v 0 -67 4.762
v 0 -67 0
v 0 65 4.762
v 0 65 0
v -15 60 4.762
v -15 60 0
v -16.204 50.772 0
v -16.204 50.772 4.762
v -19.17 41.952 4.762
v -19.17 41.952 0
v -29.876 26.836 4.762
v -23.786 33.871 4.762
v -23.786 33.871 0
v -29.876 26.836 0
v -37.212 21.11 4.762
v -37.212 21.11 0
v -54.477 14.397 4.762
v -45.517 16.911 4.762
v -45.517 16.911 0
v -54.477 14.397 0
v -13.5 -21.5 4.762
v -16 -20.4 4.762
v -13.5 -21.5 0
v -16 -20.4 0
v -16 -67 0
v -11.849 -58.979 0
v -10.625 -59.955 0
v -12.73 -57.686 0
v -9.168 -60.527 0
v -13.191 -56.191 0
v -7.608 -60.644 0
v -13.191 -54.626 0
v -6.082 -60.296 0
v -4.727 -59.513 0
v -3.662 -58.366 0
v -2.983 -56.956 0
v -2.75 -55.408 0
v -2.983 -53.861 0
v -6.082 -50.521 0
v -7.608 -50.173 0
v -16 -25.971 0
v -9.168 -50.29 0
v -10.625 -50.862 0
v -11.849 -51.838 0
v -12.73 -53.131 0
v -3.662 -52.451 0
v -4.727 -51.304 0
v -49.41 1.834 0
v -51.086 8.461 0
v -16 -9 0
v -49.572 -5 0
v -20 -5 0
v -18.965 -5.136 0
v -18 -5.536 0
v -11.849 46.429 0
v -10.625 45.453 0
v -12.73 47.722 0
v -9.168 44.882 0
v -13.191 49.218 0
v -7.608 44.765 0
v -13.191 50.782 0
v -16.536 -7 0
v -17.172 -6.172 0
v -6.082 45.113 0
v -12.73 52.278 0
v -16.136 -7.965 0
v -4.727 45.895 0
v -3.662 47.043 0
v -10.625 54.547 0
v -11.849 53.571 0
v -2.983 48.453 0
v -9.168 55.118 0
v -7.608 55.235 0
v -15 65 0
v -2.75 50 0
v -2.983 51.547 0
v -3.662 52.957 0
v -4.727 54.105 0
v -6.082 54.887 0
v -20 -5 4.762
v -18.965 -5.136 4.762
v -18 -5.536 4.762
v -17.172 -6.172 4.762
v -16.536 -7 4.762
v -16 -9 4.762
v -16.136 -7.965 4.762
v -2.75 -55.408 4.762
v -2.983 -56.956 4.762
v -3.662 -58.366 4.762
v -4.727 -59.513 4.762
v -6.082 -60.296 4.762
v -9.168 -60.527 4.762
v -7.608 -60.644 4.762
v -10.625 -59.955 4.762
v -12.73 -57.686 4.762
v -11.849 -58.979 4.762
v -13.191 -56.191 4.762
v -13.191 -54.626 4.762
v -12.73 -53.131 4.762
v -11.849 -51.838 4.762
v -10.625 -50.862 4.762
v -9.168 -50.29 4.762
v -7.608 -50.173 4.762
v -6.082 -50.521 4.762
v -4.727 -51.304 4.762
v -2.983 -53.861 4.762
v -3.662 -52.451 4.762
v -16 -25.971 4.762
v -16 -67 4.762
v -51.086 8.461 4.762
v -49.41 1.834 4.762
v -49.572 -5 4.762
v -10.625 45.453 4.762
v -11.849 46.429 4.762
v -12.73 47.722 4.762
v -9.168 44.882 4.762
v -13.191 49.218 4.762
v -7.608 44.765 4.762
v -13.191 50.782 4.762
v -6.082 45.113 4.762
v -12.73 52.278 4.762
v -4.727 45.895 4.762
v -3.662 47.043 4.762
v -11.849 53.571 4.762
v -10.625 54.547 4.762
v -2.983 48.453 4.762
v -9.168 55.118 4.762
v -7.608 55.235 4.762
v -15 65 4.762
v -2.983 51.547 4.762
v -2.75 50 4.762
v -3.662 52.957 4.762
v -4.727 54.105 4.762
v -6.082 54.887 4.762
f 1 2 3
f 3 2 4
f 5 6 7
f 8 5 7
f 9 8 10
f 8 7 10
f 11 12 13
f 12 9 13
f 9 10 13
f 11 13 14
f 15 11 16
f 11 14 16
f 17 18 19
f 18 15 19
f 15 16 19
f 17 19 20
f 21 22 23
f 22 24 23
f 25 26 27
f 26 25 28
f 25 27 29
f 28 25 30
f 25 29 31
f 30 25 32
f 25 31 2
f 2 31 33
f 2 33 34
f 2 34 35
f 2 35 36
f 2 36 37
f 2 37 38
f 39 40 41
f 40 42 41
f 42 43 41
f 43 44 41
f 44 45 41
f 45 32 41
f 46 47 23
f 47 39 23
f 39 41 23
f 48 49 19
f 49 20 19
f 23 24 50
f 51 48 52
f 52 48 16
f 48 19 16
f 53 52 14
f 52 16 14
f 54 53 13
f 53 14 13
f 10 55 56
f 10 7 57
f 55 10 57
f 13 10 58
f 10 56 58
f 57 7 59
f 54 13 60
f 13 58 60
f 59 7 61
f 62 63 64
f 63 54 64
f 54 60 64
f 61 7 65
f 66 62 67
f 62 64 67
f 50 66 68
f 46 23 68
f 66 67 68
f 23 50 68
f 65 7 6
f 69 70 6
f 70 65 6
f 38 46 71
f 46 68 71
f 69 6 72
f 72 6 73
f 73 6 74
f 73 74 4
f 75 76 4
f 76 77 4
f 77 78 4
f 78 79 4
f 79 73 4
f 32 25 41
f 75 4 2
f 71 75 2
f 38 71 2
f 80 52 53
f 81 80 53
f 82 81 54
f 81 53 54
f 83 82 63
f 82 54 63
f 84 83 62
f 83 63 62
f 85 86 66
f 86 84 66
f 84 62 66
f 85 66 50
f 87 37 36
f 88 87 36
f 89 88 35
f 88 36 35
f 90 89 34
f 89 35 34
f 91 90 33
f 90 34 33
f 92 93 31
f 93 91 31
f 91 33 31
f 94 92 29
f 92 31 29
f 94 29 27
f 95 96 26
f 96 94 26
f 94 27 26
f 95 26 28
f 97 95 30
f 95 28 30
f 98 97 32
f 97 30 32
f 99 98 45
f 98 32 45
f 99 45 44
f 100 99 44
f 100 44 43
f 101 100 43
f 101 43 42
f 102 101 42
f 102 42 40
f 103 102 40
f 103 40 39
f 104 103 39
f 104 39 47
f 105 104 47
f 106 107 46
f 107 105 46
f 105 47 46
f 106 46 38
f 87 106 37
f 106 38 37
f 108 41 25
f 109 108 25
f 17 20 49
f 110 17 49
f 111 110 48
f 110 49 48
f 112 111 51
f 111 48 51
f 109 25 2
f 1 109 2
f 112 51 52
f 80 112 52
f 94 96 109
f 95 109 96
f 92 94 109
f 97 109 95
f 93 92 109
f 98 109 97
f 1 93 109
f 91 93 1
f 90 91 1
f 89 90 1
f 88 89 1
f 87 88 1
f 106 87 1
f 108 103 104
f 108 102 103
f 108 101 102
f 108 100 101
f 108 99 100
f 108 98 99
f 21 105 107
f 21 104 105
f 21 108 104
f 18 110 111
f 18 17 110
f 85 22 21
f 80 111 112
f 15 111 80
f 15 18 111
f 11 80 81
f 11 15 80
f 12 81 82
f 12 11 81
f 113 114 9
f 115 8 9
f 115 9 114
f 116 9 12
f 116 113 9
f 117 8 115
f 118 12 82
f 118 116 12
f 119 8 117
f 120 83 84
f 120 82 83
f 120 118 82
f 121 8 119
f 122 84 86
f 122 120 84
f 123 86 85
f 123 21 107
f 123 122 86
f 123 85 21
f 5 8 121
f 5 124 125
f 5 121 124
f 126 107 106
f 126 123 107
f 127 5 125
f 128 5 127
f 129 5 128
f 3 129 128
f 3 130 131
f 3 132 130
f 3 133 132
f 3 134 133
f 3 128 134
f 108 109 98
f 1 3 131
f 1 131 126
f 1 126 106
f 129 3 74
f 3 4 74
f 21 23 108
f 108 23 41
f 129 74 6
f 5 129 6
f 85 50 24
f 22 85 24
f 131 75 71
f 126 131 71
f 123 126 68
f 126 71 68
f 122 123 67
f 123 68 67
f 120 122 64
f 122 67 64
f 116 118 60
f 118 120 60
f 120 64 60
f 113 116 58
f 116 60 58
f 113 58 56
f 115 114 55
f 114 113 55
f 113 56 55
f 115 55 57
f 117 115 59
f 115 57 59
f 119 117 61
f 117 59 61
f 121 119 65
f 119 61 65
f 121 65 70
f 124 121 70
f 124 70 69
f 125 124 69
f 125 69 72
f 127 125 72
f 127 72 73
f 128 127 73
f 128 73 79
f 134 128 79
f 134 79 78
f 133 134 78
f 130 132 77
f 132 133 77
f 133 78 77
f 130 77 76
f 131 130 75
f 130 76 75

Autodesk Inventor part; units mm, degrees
ref_plane "YZ Plane" through (0, 0, 0) normal (1, 0, 0) x (0, 1, 0)
ref_plane "XZ Plane" through (0, 0, 0) normal (0, 1, 0) x (-1, 0, 0)
ref_plane "XY Plane" through (0, 0, 0) normal (0, 0, 1) x (1, 0, 0)
sketch "Sketch1" plane through (0, 0, 0) normal (0, 0, 1) x (1, 0, 0)
  arc A0 (-54.4767, 14.3972) -> (-15, 60) centre (-62.8769, 61.5571) ccw
  arc A1 (-49.5719, -5) -> (-54.4767, 14.3972) centre (-74.5236, -0.9906) ccw
  line L0 (-49.5719, -5) -> (-20, -5)
  arc A2 (-16, -9) -> (-20, -5) centre (-20, -9) ccw
  line L1 (-16, -9) -> (-16, -20.3999)
  line L2 (-16, -20.3999) -> (-13.5, -21.5)
  line L3 (-13.5, -21.5) -> (-16, -25.9706)
  line L4 (-16, -25.9706) -> (-16, -67)
  line L5 (-16, -67) -> (0, -67)
  line L6 (0, -67) -> (0, 65)
  line L7 (0, 65) -> (-15, 65)
  line L8 (-15, 65) -> (-15, 60)
  circle A3 centre (-8, 50) radius 5.25
  circle A4 centre (-8, -55.4085) radius 5.25
  arc A5 (-54.4767, 14.3972) -> (-15, 60) centre (-62.8769, 61.5571) ccw
  arc A6 (-49.5719, -5) -> (-54.4767, 14.3972) centre (-74.5236, -0.9906) ccw
  line L9 (-49.5719, -5) -> (-20, -5)
  arc A7 (-16, -9) -> (-20, -5) centre (-20, -9) ccw
  line L10 (-16, -9) -> (-16, -20.3999)
  line L11 (-16, -20.3999) -> (-13.5, -21.5)
  line L12 (-13.5, -21.5) -> (-16, -25.9706)
  line L13 (-16, -25.9706) -> (-16, -67)
  line L14 (-16, -67) -> (0, -67)
  line L15 (0, -67) -> (0, 65)
  line L16 (0, 65) -> (-15, 65)
  line L17 (-15, 65) -> (-15, 60)
  circle A8 centre (-8, 50) radius 5.25
  circle A9 centre (-8, -55.4085) radius 5.25
  point P0 (0, 0)
extrude "Extrusion1" add sketch "Sketch1" along normal blind 4.7625
properties part number "1-4inch_FixedKnifeBig_Piece1"
